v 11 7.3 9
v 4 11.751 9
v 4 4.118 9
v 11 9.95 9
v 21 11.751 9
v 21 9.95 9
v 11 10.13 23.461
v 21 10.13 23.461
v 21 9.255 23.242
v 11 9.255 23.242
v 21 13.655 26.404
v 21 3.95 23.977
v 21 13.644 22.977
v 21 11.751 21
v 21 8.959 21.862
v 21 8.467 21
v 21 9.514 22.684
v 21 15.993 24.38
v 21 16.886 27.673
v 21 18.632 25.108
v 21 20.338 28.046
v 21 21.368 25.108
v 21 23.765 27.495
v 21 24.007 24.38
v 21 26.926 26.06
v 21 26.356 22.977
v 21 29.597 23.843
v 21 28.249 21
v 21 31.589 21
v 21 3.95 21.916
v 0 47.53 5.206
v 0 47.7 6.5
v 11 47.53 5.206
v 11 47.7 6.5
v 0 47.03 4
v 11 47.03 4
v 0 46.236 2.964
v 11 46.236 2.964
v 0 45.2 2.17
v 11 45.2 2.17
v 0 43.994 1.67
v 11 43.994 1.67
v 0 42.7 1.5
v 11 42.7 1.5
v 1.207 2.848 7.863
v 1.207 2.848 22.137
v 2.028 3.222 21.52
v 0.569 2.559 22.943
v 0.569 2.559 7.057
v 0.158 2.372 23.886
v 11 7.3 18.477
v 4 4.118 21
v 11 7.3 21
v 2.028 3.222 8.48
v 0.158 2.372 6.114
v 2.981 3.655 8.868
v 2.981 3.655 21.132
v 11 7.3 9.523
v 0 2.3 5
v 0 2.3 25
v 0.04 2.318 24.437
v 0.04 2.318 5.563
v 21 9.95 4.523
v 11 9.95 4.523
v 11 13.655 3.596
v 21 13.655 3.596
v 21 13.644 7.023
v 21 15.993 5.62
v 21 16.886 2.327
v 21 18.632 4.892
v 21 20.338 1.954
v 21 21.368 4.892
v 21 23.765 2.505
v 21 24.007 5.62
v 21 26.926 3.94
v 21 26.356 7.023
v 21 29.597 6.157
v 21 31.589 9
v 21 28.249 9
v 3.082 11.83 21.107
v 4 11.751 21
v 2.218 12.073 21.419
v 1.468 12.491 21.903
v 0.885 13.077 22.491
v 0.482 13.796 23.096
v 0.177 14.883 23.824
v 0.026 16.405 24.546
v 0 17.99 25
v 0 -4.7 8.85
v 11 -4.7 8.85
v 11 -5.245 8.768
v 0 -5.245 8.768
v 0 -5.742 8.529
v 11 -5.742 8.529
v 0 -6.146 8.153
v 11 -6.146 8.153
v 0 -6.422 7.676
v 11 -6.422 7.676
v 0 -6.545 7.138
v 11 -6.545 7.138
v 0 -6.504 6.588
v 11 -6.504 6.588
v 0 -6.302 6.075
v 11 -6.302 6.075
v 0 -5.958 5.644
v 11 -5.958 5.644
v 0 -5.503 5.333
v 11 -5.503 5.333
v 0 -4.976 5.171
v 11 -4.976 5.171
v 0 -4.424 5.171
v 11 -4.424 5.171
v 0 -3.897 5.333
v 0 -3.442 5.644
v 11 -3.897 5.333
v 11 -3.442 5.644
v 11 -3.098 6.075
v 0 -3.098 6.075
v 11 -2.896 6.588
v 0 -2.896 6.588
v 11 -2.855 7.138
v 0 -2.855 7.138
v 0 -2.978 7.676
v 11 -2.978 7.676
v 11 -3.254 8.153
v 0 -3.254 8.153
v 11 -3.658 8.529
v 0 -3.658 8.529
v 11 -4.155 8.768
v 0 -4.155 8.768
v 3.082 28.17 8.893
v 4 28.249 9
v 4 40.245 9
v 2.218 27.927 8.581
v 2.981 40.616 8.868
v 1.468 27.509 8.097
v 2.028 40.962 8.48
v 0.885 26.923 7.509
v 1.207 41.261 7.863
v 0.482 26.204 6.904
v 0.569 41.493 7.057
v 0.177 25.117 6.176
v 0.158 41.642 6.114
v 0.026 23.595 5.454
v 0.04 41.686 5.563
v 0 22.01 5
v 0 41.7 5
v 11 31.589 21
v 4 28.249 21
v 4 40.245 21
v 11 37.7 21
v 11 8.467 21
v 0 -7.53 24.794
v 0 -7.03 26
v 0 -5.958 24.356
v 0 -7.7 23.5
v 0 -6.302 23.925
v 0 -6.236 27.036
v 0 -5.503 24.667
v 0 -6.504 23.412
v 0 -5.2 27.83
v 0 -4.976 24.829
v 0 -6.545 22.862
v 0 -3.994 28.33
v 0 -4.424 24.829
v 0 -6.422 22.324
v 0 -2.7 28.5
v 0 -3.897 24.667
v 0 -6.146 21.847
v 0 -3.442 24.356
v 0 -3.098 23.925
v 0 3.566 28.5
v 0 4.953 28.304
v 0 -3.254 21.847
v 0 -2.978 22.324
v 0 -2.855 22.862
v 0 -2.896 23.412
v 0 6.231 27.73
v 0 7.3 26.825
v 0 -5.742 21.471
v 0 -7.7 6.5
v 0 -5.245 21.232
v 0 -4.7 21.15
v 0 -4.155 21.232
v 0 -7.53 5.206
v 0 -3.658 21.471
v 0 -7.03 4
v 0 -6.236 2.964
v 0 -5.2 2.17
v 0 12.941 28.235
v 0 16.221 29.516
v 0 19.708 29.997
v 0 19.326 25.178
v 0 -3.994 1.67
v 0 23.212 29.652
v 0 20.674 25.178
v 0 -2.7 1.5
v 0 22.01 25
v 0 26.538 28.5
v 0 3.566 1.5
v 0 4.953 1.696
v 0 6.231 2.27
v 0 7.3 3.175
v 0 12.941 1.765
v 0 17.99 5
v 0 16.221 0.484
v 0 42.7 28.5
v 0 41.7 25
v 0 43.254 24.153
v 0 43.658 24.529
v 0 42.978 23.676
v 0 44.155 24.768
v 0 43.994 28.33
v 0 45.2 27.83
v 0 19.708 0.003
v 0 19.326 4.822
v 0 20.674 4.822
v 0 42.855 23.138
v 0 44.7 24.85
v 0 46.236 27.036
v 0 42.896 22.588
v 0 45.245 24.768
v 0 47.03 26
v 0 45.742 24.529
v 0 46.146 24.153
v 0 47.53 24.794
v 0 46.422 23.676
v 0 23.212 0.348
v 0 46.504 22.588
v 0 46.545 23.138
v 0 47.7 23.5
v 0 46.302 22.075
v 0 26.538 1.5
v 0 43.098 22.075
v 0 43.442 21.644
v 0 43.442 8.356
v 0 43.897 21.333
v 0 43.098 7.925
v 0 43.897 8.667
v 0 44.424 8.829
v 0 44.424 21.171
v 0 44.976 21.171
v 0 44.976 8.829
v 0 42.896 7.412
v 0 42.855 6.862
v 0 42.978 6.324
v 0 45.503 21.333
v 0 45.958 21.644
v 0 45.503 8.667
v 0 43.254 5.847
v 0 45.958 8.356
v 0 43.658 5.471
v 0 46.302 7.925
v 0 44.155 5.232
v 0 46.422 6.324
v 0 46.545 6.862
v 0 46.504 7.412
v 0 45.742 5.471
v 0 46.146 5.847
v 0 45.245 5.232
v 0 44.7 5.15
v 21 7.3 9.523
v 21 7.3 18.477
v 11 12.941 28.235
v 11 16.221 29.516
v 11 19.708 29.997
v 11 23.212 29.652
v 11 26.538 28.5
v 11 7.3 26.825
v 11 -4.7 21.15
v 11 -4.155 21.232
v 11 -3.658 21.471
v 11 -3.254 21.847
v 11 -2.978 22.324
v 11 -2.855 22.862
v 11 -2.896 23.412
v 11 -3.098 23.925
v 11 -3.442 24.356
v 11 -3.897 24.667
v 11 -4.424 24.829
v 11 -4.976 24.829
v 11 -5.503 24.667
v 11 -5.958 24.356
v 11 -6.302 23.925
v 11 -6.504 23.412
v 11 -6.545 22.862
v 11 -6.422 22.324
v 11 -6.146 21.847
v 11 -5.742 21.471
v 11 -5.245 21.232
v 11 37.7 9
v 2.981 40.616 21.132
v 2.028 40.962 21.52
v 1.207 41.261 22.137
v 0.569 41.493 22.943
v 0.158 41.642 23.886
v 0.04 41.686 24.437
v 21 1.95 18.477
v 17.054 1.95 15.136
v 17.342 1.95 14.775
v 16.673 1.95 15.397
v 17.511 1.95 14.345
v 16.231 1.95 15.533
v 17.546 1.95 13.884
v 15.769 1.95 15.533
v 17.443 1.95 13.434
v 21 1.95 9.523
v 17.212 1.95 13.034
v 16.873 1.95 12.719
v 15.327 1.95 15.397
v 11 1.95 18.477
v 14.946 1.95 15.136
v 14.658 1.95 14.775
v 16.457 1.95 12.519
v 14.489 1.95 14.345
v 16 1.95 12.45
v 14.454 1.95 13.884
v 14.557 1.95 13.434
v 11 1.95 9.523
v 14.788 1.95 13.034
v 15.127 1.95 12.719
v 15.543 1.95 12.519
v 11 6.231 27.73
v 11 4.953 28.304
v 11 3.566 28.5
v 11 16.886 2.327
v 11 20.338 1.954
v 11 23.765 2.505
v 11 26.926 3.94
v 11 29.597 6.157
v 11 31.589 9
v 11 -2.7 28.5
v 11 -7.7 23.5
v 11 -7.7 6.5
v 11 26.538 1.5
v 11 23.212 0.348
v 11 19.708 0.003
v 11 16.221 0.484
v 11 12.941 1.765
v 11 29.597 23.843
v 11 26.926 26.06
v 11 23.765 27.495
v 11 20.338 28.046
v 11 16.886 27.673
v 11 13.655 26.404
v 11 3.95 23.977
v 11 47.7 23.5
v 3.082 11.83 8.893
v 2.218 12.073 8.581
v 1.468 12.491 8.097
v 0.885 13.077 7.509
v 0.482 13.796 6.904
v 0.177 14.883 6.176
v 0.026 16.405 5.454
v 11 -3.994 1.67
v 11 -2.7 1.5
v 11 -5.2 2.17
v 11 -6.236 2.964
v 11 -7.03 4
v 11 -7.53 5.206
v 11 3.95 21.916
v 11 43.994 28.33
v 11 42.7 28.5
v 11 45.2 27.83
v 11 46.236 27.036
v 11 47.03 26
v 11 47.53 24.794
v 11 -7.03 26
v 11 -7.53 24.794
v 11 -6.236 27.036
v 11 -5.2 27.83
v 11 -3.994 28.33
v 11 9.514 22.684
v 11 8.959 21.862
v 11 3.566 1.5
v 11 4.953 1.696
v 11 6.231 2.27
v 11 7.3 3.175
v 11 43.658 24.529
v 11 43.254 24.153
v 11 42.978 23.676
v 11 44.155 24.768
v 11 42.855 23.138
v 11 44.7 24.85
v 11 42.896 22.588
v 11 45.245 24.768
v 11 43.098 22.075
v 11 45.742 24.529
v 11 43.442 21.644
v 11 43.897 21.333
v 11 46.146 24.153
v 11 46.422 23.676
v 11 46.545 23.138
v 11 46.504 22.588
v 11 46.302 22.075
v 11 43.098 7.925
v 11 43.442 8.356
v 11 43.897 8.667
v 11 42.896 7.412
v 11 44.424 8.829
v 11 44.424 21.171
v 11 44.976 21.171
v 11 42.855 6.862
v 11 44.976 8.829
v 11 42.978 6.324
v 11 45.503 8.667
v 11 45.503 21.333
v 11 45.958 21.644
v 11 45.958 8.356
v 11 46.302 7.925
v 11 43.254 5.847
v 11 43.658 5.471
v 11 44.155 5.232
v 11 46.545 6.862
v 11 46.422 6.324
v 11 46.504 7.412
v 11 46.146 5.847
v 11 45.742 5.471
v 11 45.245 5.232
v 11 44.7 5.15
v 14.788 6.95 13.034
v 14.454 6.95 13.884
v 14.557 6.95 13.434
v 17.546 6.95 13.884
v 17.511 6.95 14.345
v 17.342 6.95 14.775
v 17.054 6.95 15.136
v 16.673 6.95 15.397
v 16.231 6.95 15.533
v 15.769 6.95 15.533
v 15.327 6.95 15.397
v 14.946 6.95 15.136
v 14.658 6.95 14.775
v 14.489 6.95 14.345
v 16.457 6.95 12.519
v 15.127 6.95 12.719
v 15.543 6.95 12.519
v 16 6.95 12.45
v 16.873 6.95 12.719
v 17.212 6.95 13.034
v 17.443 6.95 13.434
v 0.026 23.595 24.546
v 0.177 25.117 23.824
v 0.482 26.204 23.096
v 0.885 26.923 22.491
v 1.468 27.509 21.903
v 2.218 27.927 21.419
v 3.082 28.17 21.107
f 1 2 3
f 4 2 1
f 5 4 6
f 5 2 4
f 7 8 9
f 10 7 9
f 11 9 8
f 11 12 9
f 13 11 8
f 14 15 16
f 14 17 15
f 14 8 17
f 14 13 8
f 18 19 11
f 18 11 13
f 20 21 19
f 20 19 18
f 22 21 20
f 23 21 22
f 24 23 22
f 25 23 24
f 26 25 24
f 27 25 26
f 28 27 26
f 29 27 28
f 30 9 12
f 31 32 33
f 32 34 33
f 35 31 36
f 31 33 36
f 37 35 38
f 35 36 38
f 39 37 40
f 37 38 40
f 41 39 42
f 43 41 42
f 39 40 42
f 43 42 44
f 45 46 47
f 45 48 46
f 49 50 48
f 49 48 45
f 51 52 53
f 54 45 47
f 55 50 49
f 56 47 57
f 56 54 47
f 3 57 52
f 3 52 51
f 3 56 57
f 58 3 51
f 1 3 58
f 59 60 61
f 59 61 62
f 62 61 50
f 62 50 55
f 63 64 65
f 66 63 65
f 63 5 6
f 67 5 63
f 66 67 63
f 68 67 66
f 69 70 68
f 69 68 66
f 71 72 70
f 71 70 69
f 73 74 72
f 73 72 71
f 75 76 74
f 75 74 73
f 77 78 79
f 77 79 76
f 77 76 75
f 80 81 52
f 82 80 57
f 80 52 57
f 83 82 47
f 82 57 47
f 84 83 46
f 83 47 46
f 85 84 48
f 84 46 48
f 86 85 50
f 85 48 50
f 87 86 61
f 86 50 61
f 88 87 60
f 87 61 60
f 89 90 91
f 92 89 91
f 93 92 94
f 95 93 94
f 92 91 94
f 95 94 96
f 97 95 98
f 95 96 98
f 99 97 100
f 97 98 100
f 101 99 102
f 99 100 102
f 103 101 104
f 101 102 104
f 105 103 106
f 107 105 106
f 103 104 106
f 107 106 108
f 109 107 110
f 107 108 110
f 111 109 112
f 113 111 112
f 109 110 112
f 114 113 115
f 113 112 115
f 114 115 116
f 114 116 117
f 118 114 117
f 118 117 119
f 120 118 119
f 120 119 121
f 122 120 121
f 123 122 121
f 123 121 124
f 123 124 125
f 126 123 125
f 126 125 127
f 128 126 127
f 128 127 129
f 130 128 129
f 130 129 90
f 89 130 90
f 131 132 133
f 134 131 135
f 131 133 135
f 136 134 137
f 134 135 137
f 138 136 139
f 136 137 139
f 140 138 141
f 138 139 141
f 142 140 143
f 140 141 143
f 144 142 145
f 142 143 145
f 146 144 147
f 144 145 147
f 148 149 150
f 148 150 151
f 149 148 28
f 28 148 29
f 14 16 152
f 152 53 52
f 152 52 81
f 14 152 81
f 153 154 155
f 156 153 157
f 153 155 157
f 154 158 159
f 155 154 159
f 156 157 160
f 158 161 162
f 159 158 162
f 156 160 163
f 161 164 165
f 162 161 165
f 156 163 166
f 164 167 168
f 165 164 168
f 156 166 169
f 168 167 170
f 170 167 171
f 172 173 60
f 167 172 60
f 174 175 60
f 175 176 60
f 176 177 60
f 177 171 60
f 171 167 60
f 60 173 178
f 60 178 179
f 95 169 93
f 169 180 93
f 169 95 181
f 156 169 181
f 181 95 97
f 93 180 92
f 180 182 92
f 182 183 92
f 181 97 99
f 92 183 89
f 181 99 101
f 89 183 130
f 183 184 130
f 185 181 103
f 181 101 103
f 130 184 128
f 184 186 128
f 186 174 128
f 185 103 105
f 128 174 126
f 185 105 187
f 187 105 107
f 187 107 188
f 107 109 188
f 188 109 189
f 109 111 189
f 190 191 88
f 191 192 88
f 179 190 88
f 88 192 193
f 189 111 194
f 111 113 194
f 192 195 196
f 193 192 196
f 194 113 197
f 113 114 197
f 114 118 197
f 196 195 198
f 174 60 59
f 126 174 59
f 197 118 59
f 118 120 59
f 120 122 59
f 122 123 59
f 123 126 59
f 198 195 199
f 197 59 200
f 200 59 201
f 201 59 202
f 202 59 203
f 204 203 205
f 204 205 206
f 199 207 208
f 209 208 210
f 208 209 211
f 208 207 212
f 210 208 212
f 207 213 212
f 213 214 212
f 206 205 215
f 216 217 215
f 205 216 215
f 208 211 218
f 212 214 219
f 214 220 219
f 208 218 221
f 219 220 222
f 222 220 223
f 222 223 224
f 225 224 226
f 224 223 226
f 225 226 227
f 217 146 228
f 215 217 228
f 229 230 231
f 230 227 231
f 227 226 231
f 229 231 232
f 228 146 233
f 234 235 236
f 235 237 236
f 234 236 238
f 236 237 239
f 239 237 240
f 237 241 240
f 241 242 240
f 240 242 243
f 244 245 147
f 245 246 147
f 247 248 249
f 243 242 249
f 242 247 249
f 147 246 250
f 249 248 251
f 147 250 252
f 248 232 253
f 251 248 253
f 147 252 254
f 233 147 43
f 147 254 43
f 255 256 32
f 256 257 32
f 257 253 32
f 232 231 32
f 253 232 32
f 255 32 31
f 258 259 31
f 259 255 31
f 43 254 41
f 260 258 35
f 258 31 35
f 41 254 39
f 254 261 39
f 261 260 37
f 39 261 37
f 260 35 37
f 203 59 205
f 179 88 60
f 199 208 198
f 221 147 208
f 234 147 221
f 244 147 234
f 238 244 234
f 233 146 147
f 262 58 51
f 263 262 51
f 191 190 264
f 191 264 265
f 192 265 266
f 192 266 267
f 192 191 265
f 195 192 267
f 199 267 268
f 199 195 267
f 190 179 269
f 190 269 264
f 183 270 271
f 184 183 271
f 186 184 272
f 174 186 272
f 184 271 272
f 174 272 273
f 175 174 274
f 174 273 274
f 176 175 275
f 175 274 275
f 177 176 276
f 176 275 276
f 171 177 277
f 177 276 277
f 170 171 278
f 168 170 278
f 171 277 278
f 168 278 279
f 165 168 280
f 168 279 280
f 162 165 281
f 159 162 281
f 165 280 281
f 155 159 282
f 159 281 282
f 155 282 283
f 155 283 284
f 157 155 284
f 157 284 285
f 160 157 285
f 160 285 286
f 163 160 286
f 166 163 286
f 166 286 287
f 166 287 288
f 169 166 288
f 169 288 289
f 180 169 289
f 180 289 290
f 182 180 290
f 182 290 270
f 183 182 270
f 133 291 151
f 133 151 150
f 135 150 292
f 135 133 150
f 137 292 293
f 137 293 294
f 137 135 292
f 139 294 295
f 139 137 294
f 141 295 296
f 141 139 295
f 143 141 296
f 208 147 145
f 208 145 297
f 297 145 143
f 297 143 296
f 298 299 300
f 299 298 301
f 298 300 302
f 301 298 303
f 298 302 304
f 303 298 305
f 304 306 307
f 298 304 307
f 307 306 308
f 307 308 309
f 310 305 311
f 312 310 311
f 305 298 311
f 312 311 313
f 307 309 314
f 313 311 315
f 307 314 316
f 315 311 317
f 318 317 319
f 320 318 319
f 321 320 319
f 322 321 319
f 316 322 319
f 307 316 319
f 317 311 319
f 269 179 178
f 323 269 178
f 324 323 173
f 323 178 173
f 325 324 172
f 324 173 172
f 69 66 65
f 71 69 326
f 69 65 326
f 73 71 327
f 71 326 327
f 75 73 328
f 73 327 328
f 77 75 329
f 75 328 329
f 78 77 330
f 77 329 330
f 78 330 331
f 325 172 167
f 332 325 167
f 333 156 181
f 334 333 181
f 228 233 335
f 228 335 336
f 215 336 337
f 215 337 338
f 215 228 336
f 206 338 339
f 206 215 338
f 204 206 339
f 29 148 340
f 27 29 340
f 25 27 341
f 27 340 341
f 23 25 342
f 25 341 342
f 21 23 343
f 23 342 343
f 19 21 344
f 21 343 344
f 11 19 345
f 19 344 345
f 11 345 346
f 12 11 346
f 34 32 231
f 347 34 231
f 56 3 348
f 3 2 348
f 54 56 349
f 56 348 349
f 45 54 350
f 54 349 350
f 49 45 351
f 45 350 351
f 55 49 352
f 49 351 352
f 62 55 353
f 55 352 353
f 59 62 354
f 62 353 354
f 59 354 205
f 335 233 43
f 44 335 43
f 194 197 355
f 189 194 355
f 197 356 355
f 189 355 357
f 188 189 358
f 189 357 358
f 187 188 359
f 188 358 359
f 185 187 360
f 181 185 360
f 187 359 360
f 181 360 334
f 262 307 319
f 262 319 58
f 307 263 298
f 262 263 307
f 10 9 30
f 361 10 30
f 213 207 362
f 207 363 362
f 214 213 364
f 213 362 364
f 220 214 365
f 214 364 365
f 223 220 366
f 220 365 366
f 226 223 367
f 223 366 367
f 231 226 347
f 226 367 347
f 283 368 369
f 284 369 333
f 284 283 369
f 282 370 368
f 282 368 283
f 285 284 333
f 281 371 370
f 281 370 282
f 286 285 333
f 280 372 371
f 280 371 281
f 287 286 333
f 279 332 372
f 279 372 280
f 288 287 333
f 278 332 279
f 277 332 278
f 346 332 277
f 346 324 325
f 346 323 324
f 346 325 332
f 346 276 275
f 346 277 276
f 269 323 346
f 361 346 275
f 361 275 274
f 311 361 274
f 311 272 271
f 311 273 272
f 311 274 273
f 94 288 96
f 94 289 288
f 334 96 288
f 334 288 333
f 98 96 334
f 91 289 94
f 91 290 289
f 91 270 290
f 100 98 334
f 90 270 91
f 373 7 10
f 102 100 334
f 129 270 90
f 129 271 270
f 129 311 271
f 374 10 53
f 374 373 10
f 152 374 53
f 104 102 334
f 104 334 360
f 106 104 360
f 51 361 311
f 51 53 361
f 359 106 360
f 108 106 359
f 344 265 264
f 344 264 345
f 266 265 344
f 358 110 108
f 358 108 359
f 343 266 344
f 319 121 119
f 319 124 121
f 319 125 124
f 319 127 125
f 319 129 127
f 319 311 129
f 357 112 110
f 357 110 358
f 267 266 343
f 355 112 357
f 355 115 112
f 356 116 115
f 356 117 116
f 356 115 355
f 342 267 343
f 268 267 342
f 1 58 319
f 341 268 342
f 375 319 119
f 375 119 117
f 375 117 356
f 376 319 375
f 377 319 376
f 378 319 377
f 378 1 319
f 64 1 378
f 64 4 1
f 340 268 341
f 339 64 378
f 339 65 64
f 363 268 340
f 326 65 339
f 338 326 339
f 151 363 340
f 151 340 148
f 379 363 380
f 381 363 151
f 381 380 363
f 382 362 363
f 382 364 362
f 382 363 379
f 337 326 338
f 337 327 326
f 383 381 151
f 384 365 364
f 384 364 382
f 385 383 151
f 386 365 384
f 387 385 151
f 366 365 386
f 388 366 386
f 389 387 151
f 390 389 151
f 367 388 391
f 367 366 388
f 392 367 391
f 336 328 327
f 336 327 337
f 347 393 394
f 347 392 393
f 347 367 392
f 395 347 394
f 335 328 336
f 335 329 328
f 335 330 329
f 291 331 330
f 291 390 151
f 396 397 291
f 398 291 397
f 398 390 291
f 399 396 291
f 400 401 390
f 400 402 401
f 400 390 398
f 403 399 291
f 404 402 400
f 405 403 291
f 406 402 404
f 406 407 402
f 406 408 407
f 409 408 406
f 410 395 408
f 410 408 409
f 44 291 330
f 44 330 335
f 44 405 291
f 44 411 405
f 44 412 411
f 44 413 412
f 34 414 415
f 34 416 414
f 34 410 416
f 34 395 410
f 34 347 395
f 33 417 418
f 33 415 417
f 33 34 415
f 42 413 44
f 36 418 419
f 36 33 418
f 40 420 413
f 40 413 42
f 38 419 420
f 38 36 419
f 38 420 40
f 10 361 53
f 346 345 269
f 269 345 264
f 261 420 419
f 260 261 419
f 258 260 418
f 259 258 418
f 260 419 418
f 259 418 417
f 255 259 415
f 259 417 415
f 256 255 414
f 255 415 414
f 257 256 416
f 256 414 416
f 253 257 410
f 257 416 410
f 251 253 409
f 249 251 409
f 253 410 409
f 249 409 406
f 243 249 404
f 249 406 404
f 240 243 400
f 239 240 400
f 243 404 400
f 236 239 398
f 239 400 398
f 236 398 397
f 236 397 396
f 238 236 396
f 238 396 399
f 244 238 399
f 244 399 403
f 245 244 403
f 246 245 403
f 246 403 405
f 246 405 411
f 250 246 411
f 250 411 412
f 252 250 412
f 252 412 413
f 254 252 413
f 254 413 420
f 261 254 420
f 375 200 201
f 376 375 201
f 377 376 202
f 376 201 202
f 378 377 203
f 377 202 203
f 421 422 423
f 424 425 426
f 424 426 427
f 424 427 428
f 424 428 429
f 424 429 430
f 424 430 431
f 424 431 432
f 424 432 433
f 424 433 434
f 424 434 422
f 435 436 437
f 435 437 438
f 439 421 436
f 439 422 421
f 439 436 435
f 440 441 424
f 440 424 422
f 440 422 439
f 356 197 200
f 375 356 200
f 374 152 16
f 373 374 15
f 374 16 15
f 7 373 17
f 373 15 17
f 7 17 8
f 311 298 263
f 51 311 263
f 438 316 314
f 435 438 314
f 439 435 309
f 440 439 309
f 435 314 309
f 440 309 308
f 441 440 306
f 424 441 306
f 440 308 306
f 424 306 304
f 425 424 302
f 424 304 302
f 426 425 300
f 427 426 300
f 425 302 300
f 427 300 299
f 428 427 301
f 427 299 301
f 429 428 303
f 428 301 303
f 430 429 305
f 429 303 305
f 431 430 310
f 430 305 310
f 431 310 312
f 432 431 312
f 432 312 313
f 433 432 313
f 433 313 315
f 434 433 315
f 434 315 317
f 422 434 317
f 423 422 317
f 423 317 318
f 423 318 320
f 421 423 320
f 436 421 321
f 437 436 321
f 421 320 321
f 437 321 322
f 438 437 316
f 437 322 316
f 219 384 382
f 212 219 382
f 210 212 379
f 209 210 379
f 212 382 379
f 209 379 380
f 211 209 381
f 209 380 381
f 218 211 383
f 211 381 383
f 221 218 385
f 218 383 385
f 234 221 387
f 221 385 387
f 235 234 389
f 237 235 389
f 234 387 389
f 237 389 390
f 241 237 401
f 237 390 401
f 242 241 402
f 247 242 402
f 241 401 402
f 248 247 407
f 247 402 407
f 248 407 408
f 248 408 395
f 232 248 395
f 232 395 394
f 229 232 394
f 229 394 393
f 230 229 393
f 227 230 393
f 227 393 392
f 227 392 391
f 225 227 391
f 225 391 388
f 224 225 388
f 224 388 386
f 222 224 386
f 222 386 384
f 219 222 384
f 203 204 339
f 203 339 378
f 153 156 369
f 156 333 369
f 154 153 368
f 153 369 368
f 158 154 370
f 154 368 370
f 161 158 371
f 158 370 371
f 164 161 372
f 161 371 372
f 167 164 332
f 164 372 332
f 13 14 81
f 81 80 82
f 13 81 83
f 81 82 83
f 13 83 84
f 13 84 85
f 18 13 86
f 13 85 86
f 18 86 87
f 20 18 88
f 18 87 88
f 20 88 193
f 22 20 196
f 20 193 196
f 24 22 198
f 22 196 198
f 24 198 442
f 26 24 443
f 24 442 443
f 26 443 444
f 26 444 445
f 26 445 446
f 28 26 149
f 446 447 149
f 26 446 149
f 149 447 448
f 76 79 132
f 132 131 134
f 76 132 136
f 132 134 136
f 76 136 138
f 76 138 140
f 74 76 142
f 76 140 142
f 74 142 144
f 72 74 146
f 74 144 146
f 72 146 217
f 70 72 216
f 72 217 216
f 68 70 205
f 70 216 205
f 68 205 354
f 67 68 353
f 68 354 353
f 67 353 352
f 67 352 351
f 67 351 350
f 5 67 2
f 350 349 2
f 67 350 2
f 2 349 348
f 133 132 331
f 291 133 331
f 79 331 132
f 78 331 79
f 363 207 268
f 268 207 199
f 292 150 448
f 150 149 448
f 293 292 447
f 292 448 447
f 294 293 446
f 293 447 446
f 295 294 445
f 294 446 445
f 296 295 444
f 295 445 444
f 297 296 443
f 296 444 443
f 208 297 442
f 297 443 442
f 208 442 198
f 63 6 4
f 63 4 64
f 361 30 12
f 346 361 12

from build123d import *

# Parameters (mm, degrees)
CROQUIS1_R              = 10
SALIENTE_EXTRUIR1_DEPTH = 11
CROQUIS2_R              = 10
SALIENTE_EXTRUIR2_DEPTH = 10
CORTAR_EXTRUIR3_DEPTH   = 10
CROQUIS8_R              = 1.55
CORTAR_EXTRUIR4_DEPTH   = 5
CORTAR_EXTRUIR5_REACH   = 52.656
CORTAR_EXTRUIR6_START   = -10
CORTAR_EXTRUIR6_DEPTH   = 10
SALIENTE_EXTRUIR5_DEPTH = 11
CORTAR_EXTRUIR9_REACH   = 59.413
CROQUIS19_R             = 1.85
SALIENTE_EXTRUIR7_DEPTH = 11
CROQUIS22_W             = 11
CROQUIS22_H             = 5
CORTAR_EXTRUIR10_DEPTH  = 12
CORTAR_EXTRUIR11_DEPTH  = 12
REDONDEO1_R             = 4
REDONDEO2_R             = 5
REDONDEO3_R             = 5


with BuildPart() as part:
    # Croquis1 → Saliente-Extruir1 (new body)
    with BuildSketch(Plane(origin=(0, 0, 0), x_dir=(0, 0, -1), z_dir=(1, 0, 0))):
        with BuildLine():
            Line((-5.780776406, 0), (-24.219223594, 0))
            ThreePointArc((-24.219223594, 0), (-24.834635803, 0.211794562), (-25.189366094, 0.757464375))
            Line((-25.189366094, 0.757464375), (-28.235294118, 12.941176471))
            ThreePointArc((-28.235294118, 12.941176471), (-15, 35), (-1.764705882, 12.941176471))
            Line((-1.764705882, 12.941176471), (-4.810633906, 0.757464375))
            ThreePointArc((-4.810633906, 0.757464375), (-5.165364197, 0.211794562), (-5.780776406, 0))
        make_face()
        with Locations((-15, 20)):
            Circle(CROQUIS1_R, mode=Mode.SUBTRACT)
    extrude(amount=SALIENTE_EXTRUIR1_DEPTH)

    # Croquis2 → Saliente-Extruir2 (add)
    with BuildSketch(Plane(origin=(11, 0, 0), x_dir=(0, 0, -1), z_dir=(1, 0, 0))):
        with BuildLine():
            Line((-23.477486008, 1.95), (-6.522513992, 1.95))
            Line((-6.522513992, 1.95), (-3.59620246, 13.655246131))
            ThreePointArc((-3.59620246, 13.655246131), (-15, 33.05), (-26.40379754, 13.655246131))
            Line((-26.40379754, 13.655246131), (-23.477486008, 1.95))
        make_face()
        with Locations((-15, 20)):
            Circle(CROQUIS2_R, mode=Mode.SUBTRACT)
    extrude(amount=SALIENTE_EXTRUIR2_DEPTH)

    # Croquis3 → Cortar-Extruir3 (cut)
    with BuildSketch(Plane(origin=(21, 0, 0), x_dir=(0, 0, -1), z_dir=(1, 0, 0))):
        Polygon((-9.522513992, 1.95), (-9.522513992, 9.95), (-4.522513992, 9.95), (-6.522513992, 1.95), align=None)
        with BuildLine():
            Line((-23.477486008, 1.95), (-18.477486008, 1.95))
            Line((-18.477486008, 1.95), (-18.477486008, 6.945227656))
            Line((-18.477486008, 6.945227656), (-18.477486008, 7.473743933))
            ThreePointArc((-18.477486008, 7.473743933), (-21.115240601, 8.528128645), (-23.461002355, 10.130276643))
            Line((-23.461002355, 10.130276643), (-23.242071918, 9.254554893))
            Line((-23.242071918, 9.254554893), (-21.915933195, 3.95))
            Line((-21.915933195, 3.95), (-23.977486008, 3.95))
            Line((-23.977486008, 3.95), (-23.477486008, 1.95))
        make_face()
    extrude(amount=-CORTAR_EXTRUIR3_DEPTH, mode=Mode.SUBTRACT)

    # Croquis8 → Cortar-Extruir4 (cut)
    with BuildSketch(Plane.XZ.offset(-1.95)):
        with Locations(Location((16, 14, 0), (0, 0, 270))):
            Circle(CROQUIS8_R)
    extrude(amount=-CORTAR_EXTRUIR4_DEPTH, mode=Mode.SUBTRACT)

    # Cortar-Extruir5: up to this face of the body (flat: up to its plane)
    cortar_extruir5_end = Plane(part.part.faces().sort_by_distance((21, 32.643992611, 15))[0])
    # Croquis11 → Cortar-Extruir5 (cut, up to the picked face)
    with BuildSketch(Plane.ZY, mode=Mode.PRIVATE) as cortar_extruir5_sk1:
        with BuildLine():
            Line((21, 32.7), (9, 32.7))
            Line((9, 32.7), (9, 28.248636251))
            ThreePointArc((9, 28.248636251), (4.8, 20), (9, 11.751363749))
            Line((9, 11.751363749), (9, 7.3))
            Line((9, 7.3), (21, 7.3))
            Line((21, 7.3), (21, 11.751363749))
            ThreePointArc((21, 11.751363749), (25.2, 20), (21, 28.248636251))
            Line((21, 28.248636251), (21, 32.7))
        make_face()
    cortar_extruir5_tool1 = split(extrude(cortar_extruir5_sk1.sketch, amount=-CORTAR_EXTRUIR5_REACH, mode=Mode.PRIVATE), bisect_by=cortar_extruir5_end, keep=Keep.BOTH, mode=Mode.PRIVATE)
    add(cortar_extruir5_tool1.solids().sort_by(Axis((0, 20, 15), (1, 0, 0)))[0], mode=Mode.SUBTRACT)

    # Croquis12 → Cortar-Extruir6 (cut)
    with BuildSketch(Plane(origin=(21, 0, 0), x_dir=(0, 0, -1), z_dir=(1, 0, 0)).offset(CORTAR_EXTRUIR6_START)):
        with BuildLine():
            Line((-18.00208261, 32.7), (-11.99791739, 32.7))
            ThreePointArc((-11.99791739, 32.7), (-15, 33.05), (-18.00208261, 32.7))
        make_face()
    extrude(amount=CORTAR_EXTRUIR6_DEPTH, mode=Mode.SUBTRACT)

    # Croquis18 → Saliente-Extruir5 (add)
    with BuildSketch(Plane.ZY):
        with BuildLine():
            Line((1.5, 7.3), (3.175, 7.3))
            Line((3.175, 7.3), (4.810633906, 0.757464375))
            ThreePointArc((4.810633906, 0.757464375), (5.165364197, 0.211794562), (5.780776406, 0))
            Line((5.780776406, 0), (24.219223594, 0))
            ThreePointArc((24.219223594, 0), (24.834635803, 0.211794562), (25.189366094, 0.757464375))
            Line((25.189366094, 0.757464375), (26.825, 7.3))
            Line((26.825, 7.3), (28.5, 7.3))
            Line((28.5, 7.3), (28.5, -7.7))
            Line((28.5, -7.7), (1.5, -7.7))
            Line((1.5, -7.7), (1.5, 7.3))
        make_face()
        with BuildLine():
            Line((1.5, 47.7), (28.5, 47.7))
            Line((28.5, 47.7), (28.5, 32.7))
            Line((28.5, 32.7), (22.981854421, 32.7))
            ThreePointArc((22.981854421, 32.7), (15, 35), (7.018145579, 32.7))
            Line((7.018145579, 32.7), (1.5, 32.7))
            Line((1.5, 32.7), (1.5, 47.7))
        make_face()
    extrude(amount=-SALIENTE_EXTRUIR5_DEPTH)

    # Croquis19 → Cortar-Extruir9 (cut, up to next)
    with BuildSketch(Plane(origin=(11, 0, 0), x_dir=(0, 0, -1), z_dir=(1, 0, 0)), mode=Mode.PRIVATE) as cortar_extruir9_sk1:
        with Locations((-23, -4.7)):
            Circle(CROQUIS19_R)
    cortar_extruir9_tool1 = extrude(cortar_extruir9_sk1.sketch, amount=-CORTAR_EXTRUIR9_REACH, mode=Mode.PRIVATE) & part.part
    # Croquis19 → Cortar-Extruir9 (cut, up to next)
    with BuildSketch(Plane(origin=(11, 0, 0), x_dir=(0, 0, -1), z_dir=(1, 0, 0)), mode=Mode.PRIVATE) as cortar_extruir9_sk2:
        with Locations(Location((-7, -4.7, 0), (0, 0, 180))):
            Circle(CROQUIS19_R)
    cortar_extruir9_tool2 = extrude(cortar_extruir9_sk2.sketch, amount=-CORTAR_EXTRUIR9_REACH, mode=Mode.PRIVATE) & part.part
    # Croquis19 → Cortar-Extruir9 (cut, up to next)
    with BuildSketch(Plane(origin=(11, 0, 0), x_dir=(0, 0, -1), z_dir=(1, 0, 0)), mode=Mode.PRIVATE) as cortar_extruir9_sk3:
        with Locations((-7, 44.7)):
            Circle(CROQUIS19_R)
    cortar_extruir9_tool3 = extrude(cortar_extruir9_sk3.sketch, amount=-CORTAR_EXTRUIR9_REACH, mode=Mode.PRIVATE) & part.part
    # Croquis19 → Cortar-Extruir9 (cut, up to next)
    with BuildSketch(Plane(origin=(11, 0, 0), x_dir=(0, 0, -1), z_dir=(1, 0, 0)), mode=Mode.PRIVATE) as cortar_extruir9_sk4:
        with Locations(Location((-23, 44.7, 0), (0, 0, 180))):
            Circle(CROQUIS19_R)
    cortar_extruir9_tool4 = extrude(cortar_extruir9_sk4.sketch, amount=-CORTAR_EXTRUIR9_REACH, mode=Mode.PRIVATE) & part.part
    add(cortar_extruir9_tool1.solids().sort_by_distance((11, -4.7, 23))[0], mode=Mode.SUBTRACT)
    add(cortar_extruir9_tool2.solids().sort_by_distance((11, -4.7, 7))[0], mode=Mode.SUBTRACT)
    add(cortar_extruir9_tool3.solids().sort_by_distance((11, 44.7, 7))[0], mode=Mode.SUBTRACT)
    add(cortar_extruir9_tool4.solids().sort_by_distance((11, 44.7, 23))[0], mode=Mode.SUBTRACT)

    # Croquis21 → Saliente-Extruir7 (add)
    with BuildSketch(Plane.ZY):
        with BuildLine():
            Line((22.981854421, 32.7), (28.5, 32.7))
            Line((28.5, 32.7), (28.5, 26.538348415))
            ThreePointArc((28.5, 26.538348415), (26.174032616, 30.007047272), (22.981854421, 32.7))
        make_face()
        with BuildLine():
            Line((1.5, 32.7), (7.018145579, 32.7))
            ThreePointArc((7.018145579, 32.7), (3.825967384, 30.007047272), (1.5, 26.538348415))
            Line((1.5, 26.538348415), (1.5, 32.7))
        make_face()
    extrude(amount=-SALIENTE_EXTRUIR7_DEPTH)

    # Croquis22 → Cortar-Extruir10 (cut)
    with BuildSketch(Plane.XY.offset(9)):
        Polygon((0, 7.3), (0, 2.3), (11, 7.3), align=None)
        with Locations((5.5, 35.2)):
            Rectangle(CROQUIS22_W, CROQUIS22_H)
    extrude(amount=CORTAR_EXTRUIR10_DEPTH, mode=Mode.SUBTRACT)

    # Croquis23 → Cortar-Extruir11 (cut)
    with BuildSketch(Plane.XY.offset(9)):
        Polygon((0, 37.7), (11, 37.7), (0, 41.7), align=None)
    extrude(amount=CORTAR_EXTRUIR11_DEPTH, mode=Mode.SUBTRACT)

    # Redondeo1
    redondeo1_edges = [part.edges().sort_by_distance(p)[0] for p in [
        (0, 34.974318125, 21),
        (0, 34.974318125, 9),
        (0, 7.025681875, 9),
        (0, 7.025681875, 21),
    ]]
    fillet(redondeo1_edges, radius=REDONDEO1_R)

    # Redondeo2
    # the kernel refuses this fillet: 5 mm, written as the material it takes off along each edge
    with BuildSketch(Plane(origin=(-9.335541963, 7.3, 28.5), x_dir=(0, 0, -1), z_dir=(1, 0, 0))) as redondeo2_piece_1:
        with BuildLine():
            CenterArc((5, -3.734216785), REDONDEO2_R, 131.682325393, 48.317674607)
            Line((0, -3.734216785), (-0.1, -3.734216785))
            Line((-0.1, -3.734216785), (-0.1, 0))
            Line((-0.1, 0), (0, 0.1))
            ThreePointArc((0, 0.1), (0.8375, 0.1), (1.6085, 0.074684336))
            Line((1.6085, 0.074684336), (1.675, 0))
        make_face()
    extrude(amount=29.671083927, mode=Mode.SUBTRACT)
    with BuildSketch(Plane(origin=(-9.335541963, 7.3, 1.5), x_dir=(0, -1, 0), z_dir=(1, 0, 0))) as redondeo2_piece_2:
        with BuildLine():
            CenterArc((3.734216785, -5), REDONDEO2_R, 90, 48.317674607)
            Line((0, -1.675), (-0.074684336, -1.6085))
            ThreePointArc((-0.074684336, -1.6085), (-0.1, -0.8375), (-0.1, 0))
            Line((-0.1, 0), (0, 0.1))
            Line((0, 0.1), (3.734216785, 0.1))
            Line((3.734216785, 0.1), (3.734216785, 0))
        make_face()
    extrude(amount=29.671083927, mode=Mode.SUBTRACT)

    # Redondeo3
    redondeo3_edges = [part.edges().sort_by_distance(p)[0] for p in [
        (5.5, -7.7, 1.5),
        (5.5, -7.7, 28.5),
        (5.5, 47.7, 1.5),
        (5.5, 47.7, 28.5),
    ]]
    fillet(redondeo3_edges, radius=REDONDEO3_R)


solid = part.part
